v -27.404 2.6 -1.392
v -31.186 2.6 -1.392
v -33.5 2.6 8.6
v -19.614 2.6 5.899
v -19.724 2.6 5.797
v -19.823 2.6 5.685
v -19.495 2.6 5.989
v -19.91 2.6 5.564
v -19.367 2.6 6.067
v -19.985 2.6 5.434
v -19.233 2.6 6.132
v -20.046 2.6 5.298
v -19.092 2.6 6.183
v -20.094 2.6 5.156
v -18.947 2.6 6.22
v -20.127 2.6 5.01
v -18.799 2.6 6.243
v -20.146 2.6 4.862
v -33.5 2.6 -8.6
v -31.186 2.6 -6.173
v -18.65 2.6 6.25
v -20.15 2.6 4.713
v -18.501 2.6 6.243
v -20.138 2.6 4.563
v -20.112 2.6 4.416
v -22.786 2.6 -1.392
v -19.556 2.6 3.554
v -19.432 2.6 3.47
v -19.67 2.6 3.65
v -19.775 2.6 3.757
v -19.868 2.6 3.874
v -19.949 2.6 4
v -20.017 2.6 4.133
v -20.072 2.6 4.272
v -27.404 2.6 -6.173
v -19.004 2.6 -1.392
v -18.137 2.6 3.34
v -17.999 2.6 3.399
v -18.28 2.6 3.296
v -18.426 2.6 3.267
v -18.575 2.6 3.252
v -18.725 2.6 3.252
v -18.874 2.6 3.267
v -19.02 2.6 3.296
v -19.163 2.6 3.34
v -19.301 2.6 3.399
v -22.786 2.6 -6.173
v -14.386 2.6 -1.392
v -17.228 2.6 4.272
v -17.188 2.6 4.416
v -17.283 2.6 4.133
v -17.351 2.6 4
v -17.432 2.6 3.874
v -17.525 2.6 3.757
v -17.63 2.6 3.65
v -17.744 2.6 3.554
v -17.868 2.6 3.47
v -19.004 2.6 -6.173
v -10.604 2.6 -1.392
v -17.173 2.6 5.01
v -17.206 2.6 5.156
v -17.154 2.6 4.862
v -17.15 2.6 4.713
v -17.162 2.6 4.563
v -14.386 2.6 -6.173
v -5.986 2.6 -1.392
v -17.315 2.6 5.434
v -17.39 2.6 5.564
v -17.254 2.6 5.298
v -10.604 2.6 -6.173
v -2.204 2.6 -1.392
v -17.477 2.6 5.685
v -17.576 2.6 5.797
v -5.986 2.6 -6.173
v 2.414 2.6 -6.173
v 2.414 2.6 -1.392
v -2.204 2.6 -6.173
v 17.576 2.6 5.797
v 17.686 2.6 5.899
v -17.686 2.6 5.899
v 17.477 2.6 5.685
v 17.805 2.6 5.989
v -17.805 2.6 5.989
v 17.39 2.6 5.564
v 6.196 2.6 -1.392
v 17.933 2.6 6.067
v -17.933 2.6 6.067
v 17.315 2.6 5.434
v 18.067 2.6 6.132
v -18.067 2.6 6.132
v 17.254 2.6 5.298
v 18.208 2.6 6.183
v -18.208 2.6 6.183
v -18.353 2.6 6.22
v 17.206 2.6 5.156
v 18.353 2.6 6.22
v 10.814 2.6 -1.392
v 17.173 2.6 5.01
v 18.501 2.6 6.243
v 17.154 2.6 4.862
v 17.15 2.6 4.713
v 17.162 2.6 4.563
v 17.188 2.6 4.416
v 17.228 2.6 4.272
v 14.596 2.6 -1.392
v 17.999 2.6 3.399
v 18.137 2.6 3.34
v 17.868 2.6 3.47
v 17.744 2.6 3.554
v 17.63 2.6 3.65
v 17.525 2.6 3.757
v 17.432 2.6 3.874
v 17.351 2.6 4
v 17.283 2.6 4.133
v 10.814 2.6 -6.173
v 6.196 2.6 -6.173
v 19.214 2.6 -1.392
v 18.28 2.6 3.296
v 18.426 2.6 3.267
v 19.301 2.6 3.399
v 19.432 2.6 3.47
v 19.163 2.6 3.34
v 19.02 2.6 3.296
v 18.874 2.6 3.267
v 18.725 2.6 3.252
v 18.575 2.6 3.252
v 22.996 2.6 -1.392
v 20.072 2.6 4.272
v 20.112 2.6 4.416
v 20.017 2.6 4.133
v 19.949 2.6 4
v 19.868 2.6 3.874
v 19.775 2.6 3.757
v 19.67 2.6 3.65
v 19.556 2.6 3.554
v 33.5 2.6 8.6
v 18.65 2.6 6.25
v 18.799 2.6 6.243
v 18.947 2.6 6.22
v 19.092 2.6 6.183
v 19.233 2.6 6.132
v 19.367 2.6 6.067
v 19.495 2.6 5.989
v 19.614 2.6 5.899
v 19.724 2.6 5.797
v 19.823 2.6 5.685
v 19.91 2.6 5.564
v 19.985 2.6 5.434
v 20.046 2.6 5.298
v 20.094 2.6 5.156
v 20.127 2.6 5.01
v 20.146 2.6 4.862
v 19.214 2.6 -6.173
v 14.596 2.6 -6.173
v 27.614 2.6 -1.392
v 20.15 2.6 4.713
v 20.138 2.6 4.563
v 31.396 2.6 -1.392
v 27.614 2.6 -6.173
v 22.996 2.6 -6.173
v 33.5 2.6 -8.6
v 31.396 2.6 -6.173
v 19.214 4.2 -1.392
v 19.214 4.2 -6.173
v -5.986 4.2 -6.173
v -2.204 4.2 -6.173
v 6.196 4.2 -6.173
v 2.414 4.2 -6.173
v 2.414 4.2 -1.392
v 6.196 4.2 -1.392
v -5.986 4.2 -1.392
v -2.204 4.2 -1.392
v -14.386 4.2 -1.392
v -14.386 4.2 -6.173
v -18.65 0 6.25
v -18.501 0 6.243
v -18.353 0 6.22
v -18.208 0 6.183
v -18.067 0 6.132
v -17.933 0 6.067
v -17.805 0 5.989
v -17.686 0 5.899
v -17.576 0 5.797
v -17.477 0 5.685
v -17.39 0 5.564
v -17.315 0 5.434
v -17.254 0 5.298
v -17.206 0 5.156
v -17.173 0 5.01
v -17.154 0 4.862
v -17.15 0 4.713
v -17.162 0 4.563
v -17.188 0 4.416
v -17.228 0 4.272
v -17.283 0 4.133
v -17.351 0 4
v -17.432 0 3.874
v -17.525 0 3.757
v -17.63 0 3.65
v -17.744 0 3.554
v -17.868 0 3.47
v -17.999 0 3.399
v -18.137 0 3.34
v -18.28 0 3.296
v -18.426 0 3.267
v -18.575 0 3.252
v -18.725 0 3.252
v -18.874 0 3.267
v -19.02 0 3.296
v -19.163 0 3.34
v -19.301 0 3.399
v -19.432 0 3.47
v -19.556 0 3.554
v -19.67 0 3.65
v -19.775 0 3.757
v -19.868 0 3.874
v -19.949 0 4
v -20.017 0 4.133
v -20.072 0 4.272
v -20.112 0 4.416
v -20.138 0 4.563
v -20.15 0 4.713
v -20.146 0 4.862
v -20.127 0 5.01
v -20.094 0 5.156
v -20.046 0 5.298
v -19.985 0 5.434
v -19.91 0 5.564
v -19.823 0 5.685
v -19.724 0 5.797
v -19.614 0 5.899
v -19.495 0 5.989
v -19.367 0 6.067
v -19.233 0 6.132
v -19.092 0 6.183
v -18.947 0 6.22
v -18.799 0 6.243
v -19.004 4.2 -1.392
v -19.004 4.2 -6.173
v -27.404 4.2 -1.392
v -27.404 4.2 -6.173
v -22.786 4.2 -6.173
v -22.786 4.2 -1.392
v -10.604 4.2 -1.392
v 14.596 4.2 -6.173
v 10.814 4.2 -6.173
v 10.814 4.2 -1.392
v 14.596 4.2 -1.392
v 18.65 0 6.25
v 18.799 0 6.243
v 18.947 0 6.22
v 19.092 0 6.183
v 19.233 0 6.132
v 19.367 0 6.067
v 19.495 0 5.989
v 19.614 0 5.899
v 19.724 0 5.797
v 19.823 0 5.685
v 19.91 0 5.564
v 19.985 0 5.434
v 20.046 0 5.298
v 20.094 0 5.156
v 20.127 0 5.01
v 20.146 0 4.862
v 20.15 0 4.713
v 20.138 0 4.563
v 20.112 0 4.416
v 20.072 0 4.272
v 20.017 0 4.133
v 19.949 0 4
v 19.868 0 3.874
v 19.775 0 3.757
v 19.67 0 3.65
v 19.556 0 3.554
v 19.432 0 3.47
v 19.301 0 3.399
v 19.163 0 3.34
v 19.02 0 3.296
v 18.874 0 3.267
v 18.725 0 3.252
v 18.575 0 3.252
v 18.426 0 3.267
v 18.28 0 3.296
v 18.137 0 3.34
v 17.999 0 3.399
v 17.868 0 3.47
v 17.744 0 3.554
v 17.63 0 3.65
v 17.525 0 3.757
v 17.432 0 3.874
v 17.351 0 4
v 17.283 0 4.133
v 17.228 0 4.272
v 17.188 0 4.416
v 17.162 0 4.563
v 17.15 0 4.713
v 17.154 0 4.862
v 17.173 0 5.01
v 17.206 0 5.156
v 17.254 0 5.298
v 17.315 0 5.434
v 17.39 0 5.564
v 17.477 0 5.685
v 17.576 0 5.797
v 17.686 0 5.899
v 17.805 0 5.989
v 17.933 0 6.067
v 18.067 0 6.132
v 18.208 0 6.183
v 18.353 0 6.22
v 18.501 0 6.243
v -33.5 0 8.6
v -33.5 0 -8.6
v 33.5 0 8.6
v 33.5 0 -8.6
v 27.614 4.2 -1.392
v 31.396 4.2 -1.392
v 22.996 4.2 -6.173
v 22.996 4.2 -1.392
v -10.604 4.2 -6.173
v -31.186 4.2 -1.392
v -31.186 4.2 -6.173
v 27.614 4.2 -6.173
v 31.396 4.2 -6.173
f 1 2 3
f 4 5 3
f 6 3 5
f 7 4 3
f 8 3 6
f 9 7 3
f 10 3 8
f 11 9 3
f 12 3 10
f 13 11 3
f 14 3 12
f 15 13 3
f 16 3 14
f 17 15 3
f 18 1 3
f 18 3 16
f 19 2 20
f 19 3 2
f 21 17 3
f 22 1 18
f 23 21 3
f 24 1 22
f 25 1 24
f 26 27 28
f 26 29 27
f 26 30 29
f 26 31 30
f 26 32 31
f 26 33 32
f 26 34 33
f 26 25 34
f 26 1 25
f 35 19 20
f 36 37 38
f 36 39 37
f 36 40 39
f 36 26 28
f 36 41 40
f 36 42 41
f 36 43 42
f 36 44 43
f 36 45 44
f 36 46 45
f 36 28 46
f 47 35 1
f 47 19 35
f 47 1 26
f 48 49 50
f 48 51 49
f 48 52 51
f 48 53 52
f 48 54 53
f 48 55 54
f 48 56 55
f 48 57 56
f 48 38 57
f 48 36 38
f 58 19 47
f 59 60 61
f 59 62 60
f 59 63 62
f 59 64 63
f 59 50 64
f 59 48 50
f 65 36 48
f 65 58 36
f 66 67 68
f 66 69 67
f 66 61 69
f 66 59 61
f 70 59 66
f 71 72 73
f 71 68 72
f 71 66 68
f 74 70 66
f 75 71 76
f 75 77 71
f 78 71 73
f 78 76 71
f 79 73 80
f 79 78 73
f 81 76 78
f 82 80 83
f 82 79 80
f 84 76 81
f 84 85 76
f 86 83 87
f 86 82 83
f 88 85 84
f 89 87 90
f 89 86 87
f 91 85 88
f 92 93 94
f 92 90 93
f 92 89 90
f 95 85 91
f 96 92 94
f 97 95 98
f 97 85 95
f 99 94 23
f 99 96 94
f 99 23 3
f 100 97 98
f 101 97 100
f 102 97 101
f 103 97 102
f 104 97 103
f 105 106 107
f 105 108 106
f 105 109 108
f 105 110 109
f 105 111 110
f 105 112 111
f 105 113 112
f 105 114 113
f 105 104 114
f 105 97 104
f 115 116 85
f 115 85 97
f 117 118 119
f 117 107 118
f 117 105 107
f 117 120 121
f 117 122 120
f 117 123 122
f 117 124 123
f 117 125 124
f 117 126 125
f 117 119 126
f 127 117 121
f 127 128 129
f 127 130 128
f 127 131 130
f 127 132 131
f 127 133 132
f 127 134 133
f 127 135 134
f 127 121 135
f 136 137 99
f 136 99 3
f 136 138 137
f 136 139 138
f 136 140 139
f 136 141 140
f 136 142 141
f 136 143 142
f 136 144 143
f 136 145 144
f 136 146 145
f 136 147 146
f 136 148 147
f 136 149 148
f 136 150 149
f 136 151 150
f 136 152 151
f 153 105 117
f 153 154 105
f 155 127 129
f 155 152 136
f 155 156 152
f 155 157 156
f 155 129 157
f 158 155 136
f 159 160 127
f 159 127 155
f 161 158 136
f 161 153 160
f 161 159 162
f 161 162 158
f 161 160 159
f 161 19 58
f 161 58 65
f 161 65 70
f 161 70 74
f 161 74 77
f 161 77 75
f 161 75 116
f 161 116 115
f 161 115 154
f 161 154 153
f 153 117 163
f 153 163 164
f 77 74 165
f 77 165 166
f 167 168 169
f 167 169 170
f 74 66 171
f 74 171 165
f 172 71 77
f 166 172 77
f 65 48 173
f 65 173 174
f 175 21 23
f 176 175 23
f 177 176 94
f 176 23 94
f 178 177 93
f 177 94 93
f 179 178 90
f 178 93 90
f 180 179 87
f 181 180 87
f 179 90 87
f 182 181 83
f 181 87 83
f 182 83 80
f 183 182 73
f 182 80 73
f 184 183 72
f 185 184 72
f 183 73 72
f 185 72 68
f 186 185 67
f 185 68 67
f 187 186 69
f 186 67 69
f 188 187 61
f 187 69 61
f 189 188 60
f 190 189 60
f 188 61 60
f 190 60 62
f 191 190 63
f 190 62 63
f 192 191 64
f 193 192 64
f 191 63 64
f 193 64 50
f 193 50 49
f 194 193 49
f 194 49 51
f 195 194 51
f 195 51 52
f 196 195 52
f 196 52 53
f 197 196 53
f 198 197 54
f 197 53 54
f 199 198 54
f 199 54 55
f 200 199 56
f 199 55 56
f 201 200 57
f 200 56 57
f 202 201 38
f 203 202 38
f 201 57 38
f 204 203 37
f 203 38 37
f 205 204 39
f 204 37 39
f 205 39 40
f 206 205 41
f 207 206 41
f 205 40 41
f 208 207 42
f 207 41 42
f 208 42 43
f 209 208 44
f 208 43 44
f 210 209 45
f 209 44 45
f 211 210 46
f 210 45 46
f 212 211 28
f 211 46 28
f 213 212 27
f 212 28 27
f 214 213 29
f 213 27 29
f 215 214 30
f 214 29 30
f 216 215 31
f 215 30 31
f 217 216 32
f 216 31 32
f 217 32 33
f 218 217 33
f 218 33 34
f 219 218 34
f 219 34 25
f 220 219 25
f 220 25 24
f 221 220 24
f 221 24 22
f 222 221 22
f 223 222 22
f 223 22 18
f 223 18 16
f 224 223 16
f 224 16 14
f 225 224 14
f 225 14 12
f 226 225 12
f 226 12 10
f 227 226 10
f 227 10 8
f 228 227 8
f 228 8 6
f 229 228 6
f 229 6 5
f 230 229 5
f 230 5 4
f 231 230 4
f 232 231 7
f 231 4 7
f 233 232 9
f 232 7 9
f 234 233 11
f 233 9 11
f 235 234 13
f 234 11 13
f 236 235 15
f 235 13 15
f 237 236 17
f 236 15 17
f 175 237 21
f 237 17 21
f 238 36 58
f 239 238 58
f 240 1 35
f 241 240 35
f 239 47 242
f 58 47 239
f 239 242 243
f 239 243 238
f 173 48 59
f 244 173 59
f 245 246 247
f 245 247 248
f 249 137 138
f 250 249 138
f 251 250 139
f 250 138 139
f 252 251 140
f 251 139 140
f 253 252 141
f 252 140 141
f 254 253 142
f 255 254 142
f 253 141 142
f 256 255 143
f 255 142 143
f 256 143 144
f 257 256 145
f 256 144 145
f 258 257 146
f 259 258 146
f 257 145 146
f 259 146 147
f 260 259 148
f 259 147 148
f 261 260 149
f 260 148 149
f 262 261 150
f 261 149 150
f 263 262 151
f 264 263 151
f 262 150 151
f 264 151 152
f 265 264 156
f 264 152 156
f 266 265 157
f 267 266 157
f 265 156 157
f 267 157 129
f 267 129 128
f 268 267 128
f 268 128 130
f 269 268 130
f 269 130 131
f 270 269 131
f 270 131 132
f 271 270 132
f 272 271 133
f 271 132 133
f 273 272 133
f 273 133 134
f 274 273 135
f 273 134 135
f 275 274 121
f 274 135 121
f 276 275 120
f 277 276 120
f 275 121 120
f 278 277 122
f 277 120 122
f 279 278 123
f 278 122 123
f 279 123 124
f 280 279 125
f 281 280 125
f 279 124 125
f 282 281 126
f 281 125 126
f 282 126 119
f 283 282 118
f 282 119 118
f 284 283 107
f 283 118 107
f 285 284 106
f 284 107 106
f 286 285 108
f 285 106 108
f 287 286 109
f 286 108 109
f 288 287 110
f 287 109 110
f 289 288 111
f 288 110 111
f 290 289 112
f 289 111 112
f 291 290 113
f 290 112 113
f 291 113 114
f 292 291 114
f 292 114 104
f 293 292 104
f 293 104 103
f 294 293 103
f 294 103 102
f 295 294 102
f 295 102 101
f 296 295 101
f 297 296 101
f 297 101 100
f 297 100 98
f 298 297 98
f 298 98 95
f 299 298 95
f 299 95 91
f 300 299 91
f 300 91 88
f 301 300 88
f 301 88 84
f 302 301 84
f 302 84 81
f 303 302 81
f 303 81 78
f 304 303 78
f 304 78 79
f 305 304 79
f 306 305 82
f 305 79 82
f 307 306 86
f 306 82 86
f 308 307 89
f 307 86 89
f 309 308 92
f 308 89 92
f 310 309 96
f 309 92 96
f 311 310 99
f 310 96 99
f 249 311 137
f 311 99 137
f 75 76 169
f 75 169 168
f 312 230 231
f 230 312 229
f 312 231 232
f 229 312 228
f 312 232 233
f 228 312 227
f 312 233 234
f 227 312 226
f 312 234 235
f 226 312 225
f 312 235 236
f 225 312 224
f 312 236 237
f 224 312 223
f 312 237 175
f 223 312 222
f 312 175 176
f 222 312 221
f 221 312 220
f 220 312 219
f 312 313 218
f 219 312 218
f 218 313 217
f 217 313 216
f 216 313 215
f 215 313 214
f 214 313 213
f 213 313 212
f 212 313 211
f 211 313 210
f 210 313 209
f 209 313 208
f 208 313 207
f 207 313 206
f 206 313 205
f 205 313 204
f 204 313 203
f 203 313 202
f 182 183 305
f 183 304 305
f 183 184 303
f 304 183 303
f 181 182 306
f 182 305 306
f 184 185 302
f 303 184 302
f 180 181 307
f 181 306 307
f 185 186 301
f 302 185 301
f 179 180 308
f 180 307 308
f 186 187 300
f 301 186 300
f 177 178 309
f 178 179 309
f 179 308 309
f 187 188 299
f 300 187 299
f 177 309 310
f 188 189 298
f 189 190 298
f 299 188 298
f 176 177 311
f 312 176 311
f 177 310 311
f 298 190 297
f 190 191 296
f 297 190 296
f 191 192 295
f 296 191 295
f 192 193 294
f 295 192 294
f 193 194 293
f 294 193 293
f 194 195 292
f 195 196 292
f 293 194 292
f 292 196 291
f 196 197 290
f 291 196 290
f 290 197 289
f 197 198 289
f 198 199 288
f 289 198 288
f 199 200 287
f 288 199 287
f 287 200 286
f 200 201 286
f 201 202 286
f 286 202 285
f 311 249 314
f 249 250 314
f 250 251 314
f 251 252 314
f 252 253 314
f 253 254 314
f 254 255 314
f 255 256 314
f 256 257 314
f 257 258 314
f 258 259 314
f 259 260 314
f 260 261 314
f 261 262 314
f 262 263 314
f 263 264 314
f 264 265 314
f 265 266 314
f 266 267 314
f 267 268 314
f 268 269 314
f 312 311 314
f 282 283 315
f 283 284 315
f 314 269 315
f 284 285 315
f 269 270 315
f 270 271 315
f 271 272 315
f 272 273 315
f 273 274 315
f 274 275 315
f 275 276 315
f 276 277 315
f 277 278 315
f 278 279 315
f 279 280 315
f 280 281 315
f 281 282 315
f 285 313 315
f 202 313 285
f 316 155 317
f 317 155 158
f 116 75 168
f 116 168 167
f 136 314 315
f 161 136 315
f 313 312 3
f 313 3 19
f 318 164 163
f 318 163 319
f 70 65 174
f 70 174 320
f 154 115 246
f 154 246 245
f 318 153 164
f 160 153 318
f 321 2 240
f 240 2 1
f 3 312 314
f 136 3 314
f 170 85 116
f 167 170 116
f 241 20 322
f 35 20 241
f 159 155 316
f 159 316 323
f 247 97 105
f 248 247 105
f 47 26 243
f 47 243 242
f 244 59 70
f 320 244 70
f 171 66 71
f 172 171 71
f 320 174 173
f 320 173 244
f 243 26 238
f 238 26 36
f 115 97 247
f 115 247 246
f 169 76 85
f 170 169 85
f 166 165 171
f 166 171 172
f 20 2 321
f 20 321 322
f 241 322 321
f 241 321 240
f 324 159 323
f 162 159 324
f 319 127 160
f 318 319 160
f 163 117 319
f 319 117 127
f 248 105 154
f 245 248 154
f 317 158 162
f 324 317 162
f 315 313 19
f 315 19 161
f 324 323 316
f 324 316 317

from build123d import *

# Parameters (mm, degrees)
SKETCH1_W           = 67
SKETCH1_H           = 17.2
BOSS_EXTRUDE1_DEPTH = 2.6
SKETCH2_R           = 1.5
CUT_EXTRUDE1_DEPTH  = 2.6
SKETCH3_W           = 3.782264846
SKETCH3_H           = 4.781353673
BOSS_EXTRUDE2_DEPTH = 1.6


with BuildPart() as part:
    # Sketch1 → Boss-Extrude1 (new body)
    with BuildSketch(Plane(origin=(0, 0, 0), x_dir=(1, 0, 0), z_dir=(0, 1, 0))):
        Rectangle(SKETCH1_W, SKETCH1_H)
    extrude(amount=BOSS_EXTRUDE1_DEPTH)

    # Sketch2 → Cut-Extrude1 (cut)
    with BuildSketch(Plane(origin=(0, 2.6, 0), x_dir=(1, 0, 0), z_dir=(0, 1, 0))):
        with Locations(Location((-18.65, -4.75, 0), (0, 0, 270))):
            Circle(SKETCH2_R)
        with Locations(Location((18.65, -4.75, 0), (0, 0, 270))):
            Circle(SKETCH2_R)
    extrude(amount=-CUT_EXTRUDE1_DEPTH, mode=Mode.SUBTRACT)

    # Sketch3 → Boss-Extrude2 (add)
    with BuildSketch(Plane(origin=(0, 2.6, 0), x_dir=(1, 0, 0), z_dir=(0, 1, 0))):
        with Locations((-20.894711683, 3.782264846)):
            Rectangle(SKETCH3_W, SKETCH3_H)
        with Locations((-29.294711683, 3.782264846)):
            Rectangle(SKETCH3_W, SKETCH3_H)
        with Locations((-12.494711683, 3.782264846)):
            Rectangle(SKETCH3_W, SKETCH3_H)
        with Locations((-4.094711683, 3.782264846)):
            Rectangle(SKETCH3_W, SKETCH3_H)
        with Locations((4.305288317, 3.782264846)):
            Rectangle(SKETCH3_W, SKETCH3_H)
        with Locations((12.705288317, 3.782264846)):
            Rectangle(SKETCH3_W, SKETCH3_H)
        with Locations((21.105288317, 3.782264846)):
            Rectangle(SKETCH3_W, SKETCH3_H)
        with Locations((29.505288317, 3.782264846)):
            Rectangle(SKETCH3_W, SKETCH3_H)
    extrude(amount=BOSS_EXTRUDE2_DEPTH)


solid = part.part
